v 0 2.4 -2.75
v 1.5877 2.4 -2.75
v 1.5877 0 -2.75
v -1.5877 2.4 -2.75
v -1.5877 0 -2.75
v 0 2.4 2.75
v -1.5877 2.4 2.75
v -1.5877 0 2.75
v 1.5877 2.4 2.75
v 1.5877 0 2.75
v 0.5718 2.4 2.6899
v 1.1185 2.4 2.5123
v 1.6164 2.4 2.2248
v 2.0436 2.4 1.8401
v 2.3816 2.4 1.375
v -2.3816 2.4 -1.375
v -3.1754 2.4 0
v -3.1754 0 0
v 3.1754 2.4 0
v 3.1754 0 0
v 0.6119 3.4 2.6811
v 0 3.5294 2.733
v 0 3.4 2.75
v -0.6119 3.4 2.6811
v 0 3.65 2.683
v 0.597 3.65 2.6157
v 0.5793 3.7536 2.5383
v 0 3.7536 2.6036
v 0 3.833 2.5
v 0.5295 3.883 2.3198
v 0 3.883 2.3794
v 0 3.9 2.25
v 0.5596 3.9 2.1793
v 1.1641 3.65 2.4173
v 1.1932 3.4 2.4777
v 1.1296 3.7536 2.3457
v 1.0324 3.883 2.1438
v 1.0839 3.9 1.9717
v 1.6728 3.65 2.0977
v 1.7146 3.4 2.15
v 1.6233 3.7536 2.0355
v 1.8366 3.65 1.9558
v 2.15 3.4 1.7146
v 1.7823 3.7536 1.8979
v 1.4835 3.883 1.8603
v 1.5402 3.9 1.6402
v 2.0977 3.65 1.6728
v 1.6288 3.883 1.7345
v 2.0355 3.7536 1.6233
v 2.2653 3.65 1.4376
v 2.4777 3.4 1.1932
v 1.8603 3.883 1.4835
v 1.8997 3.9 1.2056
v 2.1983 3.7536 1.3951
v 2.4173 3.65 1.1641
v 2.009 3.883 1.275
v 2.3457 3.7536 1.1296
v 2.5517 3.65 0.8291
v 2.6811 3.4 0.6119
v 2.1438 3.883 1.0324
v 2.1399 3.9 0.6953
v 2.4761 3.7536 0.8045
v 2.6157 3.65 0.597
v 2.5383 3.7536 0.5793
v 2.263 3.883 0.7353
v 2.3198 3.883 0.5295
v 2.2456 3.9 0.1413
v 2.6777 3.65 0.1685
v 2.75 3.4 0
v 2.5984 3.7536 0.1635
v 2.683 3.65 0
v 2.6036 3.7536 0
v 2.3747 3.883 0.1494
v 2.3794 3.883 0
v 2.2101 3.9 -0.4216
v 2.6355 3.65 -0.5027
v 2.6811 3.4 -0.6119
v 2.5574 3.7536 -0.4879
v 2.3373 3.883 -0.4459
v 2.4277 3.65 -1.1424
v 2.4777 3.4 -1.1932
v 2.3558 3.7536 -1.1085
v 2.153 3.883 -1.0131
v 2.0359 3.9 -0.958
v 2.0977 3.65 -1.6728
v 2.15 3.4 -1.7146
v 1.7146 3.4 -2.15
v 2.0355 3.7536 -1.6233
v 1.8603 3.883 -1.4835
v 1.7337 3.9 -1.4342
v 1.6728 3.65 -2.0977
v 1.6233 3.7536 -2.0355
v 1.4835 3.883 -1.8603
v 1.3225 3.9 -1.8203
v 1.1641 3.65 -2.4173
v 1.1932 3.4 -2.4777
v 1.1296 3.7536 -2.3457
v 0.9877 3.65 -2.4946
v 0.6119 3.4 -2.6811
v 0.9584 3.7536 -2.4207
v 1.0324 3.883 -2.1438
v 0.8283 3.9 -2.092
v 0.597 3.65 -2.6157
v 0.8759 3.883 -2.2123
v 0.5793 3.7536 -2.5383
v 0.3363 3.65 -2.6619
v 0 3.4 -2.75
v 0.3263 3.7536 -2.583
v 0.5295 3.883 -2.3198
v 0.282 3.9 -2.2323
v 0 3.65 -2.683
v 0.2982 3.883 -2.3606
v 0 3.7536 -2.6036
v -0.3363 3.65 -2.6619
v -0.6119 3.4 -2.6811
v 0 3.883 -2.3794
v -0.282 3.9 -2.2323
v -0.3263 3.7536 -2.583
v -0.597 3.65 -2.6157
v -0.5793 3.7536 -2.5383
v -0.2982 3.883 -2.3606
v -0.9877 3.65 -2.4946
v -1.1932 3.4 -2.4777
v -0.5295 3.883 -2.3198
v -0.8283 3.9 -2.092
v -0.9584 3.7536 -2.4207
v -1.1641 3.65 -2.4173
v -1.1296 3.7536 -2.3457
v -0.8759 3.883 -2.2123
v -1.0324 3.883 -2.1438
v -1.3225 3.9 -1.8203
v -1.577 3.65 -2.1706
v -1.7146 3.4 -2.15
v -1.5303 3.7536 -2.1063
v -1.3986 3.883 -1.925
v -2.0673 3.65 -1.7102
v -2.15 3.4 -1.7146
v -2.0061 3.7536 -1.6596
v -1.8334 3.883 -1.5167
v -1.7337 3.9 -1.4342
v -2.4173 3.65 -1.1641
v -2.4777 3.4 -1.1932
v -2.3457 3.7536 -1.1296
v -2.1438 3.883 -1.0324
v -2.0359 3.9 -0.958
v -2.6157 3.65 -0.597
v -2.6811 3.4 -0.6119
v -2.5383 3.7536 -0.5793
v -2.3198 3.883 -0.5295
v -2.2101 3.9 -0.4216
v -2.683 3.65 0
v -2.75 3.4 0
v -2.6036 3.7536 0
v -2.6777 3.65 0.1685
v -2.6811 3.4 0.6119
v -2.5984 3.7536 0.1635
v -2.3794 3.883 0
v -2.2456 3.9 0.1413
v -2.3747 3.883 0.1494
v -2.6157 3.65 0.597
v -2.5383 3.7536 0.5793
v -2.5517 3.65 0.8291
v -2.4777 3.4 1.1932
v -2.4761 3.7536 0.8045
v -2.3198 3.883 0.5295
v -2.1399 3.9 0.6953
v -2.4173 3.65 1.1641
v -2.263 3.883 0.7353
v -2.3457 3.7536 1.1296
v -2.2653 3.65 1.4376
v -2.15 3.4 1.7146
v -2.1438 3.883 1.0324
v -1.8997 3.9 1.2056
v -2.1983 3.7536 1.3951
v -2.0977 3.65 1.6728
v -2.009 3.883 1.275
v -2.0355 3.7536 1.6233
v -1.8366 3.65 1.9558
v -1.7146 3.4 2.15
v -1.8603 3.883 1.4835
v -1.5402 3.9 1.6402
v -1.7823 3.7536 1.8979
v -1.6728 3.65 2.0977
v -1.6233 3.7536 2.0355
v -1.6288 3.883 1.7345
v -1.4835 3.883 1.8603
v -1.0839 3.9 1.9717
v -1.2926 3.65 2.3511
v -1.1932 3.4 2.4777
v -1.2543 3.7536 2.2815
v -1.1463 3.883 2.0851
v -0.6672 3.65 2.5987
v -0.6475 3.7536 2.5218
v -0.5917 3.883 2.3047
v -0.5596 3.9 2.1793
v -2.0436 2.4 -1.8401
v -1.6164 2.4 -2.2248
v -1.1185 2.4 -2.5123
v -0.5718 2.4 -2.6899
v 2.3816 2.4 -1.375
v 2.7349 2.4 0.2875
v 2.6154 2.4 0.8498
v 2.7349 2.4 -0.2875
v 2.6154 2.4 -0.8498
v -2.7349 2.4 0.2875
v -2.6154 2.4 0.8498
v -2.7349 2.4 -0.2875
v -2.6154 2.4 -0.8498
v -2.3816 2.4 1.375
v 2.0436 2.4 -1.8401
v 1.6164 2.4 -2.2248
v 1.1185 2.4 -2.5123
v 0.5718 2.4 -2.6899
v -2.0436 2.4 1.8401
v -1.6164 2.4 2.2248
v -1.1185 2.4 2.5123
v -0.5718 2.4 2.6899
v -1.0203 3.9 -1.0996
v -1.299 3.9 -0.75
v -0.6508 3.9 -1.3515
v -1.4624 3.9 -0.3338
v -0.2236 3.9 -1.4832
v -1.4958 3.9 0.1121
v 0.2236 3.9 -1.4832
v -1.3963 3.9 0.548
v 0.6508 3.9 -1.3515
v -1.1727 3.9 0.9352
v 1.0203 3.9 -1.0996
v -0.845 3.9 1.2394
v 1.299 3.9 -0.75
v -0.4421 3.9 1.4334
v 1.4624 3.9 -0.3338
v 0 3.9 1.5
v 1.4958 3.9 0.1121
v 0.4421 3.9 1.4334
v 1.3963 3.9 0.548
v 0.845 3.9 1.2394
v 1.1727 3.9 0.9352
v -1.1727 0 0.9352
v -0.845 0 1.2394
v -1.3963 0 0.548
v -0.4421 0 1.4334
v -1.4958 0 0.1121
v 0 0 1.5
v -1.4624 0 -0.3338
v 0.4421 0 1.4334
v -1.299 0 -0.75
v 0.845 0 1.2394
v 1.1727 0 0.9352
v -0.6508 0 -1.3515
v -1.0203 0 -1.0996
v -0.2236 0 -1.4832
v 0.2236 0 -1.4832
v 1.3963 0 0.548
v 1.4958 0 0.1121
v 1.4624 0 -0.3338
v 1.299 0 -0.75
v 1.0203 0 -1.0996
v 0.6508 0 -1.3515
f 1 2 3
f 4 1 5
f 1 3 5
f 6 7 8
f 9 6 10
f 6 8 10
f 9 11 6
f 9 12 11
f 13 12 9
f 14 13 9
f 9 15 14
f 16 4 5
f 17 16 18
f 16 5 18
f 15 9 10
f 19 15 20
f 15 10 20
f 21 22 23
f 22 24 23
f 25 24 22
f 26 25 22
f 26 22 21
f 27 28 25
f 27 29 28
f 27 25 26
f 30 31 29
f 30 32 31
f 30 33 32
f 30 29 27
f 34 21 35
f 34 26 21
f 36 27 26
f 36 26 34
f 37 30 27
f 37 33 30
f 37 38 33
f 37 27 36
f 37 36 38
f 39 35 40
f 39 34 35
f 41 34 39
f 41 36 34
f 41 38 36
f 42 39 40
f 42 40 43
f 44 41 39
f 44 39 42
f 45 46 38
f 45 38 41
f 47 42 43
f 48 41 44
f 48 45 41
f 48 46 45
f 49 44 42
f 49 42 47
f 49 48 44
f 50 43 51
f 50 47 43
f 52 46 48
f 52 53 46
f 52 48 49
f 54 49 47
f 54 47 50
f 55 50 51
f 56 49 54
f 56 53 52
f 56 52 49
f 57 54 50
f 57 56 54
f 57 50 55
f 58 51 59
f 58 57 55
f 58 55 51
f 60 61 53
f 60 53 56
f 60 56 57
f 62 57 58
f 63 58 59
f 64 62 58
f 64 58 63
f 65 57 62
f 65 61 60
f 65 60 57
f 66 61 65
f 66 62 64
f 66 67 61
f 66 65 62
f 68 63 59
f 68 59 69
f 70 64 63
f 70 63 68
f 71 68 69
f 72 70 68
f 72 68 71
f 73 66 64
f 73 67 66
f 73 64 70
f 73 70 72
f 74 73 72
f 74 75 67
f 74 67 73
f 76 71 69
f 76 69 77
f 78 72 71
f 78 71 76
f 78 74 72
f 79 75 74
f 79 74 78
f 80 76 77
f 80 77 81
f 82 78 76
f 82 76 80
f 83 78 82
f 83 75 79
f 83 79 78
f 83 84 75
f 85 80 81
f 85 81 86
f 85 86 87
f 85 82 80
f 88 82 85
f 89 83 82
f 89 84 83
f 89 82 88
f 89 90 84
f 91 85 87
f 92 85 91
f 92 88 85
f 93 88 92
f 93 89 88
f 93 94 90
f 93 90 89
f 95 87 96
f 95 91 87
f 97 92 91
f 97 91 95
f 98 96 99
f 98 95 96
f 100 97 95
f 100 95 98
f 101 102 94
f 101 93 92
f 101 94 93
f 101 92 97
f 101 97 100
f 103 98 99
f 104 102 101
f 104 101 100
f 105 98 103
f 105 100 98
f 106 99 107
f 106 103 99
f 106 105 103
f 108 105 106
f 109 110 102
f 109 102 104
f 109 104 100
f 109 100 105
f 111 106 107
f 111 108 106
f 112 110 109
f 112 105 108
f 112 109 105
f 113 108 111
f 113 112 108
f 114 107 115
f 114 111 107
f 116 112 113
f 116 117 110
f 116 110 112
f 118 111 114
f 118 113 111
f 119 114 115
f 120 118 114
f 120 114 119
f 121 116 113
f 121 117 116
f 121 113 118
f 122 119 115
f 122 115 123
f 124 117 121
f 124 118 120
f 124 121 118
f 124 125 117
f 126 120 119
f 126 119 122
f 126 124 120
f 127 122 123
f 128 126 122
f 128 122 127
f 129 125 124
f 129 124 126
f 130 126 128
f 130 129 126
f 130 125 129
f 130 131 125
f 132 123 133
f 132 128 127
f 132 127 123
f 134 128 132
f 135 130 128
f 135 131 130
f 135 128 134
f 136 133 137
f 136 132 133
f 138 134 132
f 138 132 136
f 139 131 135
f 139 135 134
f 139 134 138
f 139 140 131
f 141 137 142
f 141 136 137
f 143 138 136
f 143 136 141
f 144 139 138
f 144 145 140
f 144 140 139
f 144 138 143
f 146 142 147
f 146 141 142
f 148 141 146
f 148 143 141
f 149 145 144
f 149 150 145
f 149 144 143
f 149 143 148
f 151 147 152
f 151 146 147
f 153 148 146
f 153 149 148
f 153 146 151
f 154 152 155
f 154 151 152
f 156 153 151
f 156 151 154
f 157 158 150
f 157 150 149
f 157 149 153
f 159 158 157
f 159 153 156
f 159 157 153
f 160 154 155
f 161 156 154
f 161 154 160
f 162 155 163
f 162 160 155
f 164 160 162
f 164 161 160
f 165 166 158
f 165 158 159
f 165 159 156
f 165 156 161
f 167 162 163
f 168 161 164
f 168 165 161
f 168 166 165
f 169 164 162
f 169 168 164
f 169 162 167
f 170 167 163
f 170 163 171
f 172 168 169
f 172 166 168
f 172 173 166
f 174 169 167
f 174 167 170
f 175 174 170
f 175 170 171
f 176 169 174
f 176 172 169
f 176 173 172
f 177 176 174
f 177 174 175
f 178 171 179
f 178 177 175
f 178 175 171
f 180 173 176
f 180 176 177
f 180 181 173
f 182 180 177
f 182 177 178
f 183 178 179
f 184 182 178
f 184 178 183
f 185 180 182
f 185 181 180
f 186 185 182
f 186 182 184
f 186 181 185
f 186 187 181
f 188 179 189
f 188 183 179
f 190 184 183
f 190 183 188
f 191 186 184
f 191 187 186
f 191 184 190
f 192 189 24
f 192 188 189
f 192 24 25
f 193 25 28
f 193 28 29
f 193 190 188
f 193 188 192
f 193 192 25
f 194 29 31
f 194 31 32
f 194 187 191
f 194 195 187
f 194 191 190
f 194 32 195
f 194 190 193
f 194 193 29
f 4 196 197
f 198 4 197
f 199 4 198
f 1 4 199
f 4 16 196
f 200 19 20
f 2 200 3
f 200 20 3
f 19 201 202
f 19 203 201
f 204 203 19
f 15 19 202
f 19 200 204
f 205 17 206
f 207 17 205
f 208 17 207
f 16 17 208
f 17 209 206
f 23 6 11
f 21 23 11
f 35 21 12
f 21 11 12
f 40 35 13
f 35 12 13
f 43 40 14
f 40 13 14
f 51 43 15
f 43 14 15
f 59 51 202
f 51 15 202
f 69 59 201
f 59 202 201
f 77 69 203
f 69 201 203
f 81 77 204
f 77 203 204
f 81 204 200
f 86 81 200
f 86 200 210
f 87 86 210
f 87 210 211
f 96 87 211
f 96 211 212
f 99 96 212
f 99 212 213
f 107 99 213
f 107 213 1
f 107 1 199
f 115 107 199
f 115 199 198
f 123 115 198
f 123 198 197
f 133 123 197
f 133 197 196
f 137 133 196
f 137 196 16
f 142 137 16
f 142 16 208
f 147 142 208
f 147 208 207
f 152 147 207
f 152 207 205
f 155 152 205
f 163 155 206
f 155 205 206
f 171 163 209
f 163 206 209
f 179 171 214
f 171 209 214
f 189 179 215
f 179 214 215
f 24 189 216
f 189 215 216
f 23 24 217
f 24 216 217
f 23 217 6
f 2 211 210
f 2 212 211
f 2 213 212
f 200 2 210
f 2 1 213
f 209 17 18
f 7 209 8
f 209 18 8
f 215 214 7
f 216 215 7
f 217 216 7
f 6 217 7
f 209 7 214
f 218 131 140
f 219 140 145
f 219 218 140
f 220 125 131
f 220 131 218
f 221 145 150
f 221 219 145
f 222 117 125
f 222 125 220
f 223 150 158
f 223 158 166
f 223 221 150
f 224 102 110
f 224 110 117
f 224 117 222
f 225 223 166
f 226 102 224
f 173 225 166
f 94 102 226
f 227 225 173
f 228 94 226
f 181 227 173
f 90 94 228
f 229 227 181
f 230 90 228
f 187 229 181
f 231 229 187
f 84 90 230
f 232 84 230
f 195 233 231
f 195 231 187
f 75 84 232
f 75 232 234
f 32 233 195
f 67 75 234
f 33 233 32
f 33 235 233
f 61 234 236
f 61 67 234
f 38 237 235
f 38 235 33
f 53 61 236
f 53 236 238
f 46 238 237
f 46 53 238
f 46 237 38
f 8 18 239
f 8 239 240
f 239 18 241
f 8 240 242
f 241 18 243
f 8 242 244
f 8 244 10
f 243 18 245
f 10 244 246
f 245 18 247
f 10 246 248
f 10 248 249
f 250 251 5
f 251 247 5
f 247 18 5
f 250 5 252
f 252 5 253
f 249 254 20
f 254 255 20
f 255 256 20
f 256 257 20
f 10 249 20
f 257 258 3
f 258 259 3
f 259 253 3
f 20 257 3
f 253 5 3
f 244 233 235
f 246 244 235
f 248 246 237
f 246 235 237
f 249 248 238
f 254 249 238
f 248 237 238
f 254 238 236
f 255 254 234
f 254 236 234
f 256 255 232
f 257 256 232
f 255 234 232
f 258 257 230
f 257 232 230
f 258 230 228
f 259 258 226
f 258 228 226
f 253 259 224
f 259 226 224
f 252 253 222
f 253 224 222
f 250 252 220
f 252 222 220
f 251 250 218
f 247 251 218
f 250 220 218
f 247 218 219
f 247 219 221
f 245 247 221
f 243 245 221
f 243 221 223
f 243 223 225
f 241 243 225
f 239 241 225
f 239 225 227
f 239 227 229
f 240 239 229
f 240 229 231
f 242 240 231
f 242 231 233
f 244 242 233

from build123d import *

# Parameters (mm, degrees)
EXTRUDE_1_DEPTH     = 2.4
SKETCH_2_R          = 2.75
EXTRUDE_2_DEPTH     = 1.5
SKETCH_3_R          = 1.5
CUT_EXTRUDE_1_DEPTH = 6.732000814
FILLET_1_R          = 0.5


with BuildPart() as part:
    # 草图1 → 凸台-拉伸1 (new body)
    with BuildSketch(Plane(origin=(0, 0, 0), x_dir=(1, 0, 0), z_dir=(0, 1, 0))):
        Polygon((3.175426481, 0), (1.58771324, 2.75), (-1.58771324, 2.75), (-3.175426481, 0), (-1.58771324, -2.75), (1.58771324, -2.75), align=None)
    extrude(amount=EXTRUDE_1_DEPTH)

    # 草图2 → 凸台-拉伸2 (add)
    with BuildSketch(Plane(origin=(0, 2.4, 0), x_dir=(1, 0, 0), z_dir=(0, 1, 0))):
        with Locations(Location((0, 0, 0), (0, 0, 270))):
            Circle(SKETCH_2_R)
    extrude(amount=EXTRUDE_2_DEPTH)

    # 草图3 → 切除-拉伸1 (cut, through all)
    with BuildSketch(Plane(origin=(0, 3.9, 0), x_dir=(1, 0, 0), z_dir=(0, 1, 0))):
        with Locations(Location((0, 0, 0), (0, 0, 270))):
            Circle(SKETCH_3_R)
    extrude(amount=-CUT_EXTRUDE_1_DEPTH, mode=Mode.SUBTRACT)

    # 圆角1
    fillet_1_edges = [part.edges().sort_by_distance(p)[0] for p in [
        (0, 3.9, -2.75),
    ]]
    fillet(fillet_1_edges, radius=FILLET_1_R)


solid = part.part
